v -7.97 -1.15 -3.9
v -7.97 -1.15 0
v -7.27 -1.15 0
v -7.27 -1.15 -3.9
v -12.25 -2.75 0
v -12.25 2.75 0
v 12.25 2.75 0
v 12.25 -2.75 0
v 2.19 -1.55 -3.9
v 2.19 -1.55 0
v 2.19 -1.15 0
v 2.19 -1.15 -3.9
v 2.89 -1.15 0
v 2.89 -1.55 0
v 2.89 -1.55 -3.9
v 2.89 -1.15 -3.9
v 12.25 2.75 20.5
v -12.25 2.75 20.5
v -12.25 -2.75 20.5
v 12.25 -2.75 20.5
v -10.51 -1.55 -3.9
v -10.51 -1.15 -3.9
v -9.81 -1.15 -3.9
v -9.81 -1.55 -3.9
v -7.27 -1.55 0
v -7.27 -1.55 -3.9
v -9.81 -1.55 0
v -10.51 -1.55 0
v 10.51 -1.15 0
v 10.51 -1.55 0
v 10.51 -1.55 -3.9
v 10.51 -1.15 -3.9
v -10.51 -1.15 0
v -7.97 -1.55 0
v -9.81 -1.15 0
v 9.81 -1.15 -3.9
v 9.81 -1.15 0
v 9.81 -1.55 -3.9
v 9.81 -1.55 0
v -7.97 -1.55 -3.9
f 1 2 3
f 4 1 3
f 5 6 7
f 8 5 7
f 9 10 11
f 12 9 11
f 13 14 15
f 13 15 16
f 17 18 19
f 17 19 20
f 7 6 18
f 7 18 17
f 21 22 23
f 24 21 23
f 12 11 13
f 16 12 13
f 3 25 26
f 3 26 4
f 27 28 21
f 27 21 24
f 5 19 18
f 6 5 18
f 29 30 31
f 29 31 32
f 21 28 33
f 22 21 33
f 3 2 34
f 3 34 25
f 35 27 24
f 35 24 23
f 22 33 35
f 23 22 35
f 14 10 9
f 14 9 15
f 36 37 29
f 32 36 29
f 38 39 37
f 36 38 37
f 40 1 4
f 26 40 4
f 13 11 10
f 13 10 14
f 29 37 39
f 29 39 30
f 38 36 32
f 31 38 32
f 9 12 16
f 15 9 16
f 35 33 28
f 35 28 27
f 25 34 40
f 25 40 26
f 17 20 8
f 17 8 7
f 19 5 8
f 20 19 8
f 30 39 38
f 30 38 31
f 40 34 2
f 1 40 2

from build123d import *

# Parameters (mm, degrees)
F0_W     = 24.5
F0_H     = 5.5
F0_W_2   = 0.7
F0_H_2   = 0.4
F1_DEPTH = 20.5
F2_DEPTH = 3.9


with BuildPart() as f1:
    # F0 (on Top) → F1 (new body)
    with BuildSketch(Plane.XY):
        Rectangle(F0_W, F0_H)
        with Locations((-10.16, -1.35)):
            Rectangle(F0_W_2, F0_H_2, mode=Mode.SUBTRACT)
        with Locations((-7.62, -1.35)):
            Rectangle(F0_W_2, F0_H_2, mode=Mode.SUBTRACT)
        with Locations((2.54, -1.35)):
            Rectangle(F0_W_2, F0_H_2, mode=Mode.SUBTRACT)
        with Locations((10.16, -1.35)):
            Rectangle(F0_W_2, F0_H_2, mode=Mode.SUBTRACT)
        with Locations((-10.16, -1.35)):
            Rectangle(F0_W_2, F0_H_2)
        with Locations((2.54, -1.35)):
            Rectangle(F0_W_2, F0_H_2)
        with Locations((10.16, -1.35)):
            Rectangle(F0_W_2, F0_H_2)
        with Locations((-7.62, -1.35)):
            Rectangle(F0_W_2, F0_H_2)
    extrude(amount=F1_DEPTH)


with BuildPart() as f2:
    # F0 (on Top) → F2 (new body)
    with BuildSketch(Plane.XY):
        with Locations((-10.16, -1.35)):
            Rectangle(F0_W_2, F0_H_2)
    extrude(amount=-F2_DEPTH)


with BuildPart() as f2b:
    # F0 (on Top) → F2, piece 2 (new body)
    with BuildSketch(Plane.XY):
        with Locations((-7.62, -1.35)):
            Rectangle(F0_W_2, F0_H_2)
    extrude(amount=-F2_DEPTH)


with BuildPart() as f2c:
    # F0 (on Top) → F2, piece 3 (new body)
    with BuildSketch(Plane.XY):
        with Locations((2.54, -1.35)):
            Rectangle(F0_W_2, F0_H_2)
    extrude(amount=-F2_DEPTH)


with BuildPart() as f2d:
    # F0 (on Top) → F2, piece 4 (new body)
    with BuildSketch(Plane.XY):
        with Locations((10.16, -1.35)):
            Rectangle(F0_W_2, F0_H_2)
    extrude(amount=-F2_DEPTH)


solid = Compound([f1.part, f2.part, f2b.part, f2c.part, f2d.part])
